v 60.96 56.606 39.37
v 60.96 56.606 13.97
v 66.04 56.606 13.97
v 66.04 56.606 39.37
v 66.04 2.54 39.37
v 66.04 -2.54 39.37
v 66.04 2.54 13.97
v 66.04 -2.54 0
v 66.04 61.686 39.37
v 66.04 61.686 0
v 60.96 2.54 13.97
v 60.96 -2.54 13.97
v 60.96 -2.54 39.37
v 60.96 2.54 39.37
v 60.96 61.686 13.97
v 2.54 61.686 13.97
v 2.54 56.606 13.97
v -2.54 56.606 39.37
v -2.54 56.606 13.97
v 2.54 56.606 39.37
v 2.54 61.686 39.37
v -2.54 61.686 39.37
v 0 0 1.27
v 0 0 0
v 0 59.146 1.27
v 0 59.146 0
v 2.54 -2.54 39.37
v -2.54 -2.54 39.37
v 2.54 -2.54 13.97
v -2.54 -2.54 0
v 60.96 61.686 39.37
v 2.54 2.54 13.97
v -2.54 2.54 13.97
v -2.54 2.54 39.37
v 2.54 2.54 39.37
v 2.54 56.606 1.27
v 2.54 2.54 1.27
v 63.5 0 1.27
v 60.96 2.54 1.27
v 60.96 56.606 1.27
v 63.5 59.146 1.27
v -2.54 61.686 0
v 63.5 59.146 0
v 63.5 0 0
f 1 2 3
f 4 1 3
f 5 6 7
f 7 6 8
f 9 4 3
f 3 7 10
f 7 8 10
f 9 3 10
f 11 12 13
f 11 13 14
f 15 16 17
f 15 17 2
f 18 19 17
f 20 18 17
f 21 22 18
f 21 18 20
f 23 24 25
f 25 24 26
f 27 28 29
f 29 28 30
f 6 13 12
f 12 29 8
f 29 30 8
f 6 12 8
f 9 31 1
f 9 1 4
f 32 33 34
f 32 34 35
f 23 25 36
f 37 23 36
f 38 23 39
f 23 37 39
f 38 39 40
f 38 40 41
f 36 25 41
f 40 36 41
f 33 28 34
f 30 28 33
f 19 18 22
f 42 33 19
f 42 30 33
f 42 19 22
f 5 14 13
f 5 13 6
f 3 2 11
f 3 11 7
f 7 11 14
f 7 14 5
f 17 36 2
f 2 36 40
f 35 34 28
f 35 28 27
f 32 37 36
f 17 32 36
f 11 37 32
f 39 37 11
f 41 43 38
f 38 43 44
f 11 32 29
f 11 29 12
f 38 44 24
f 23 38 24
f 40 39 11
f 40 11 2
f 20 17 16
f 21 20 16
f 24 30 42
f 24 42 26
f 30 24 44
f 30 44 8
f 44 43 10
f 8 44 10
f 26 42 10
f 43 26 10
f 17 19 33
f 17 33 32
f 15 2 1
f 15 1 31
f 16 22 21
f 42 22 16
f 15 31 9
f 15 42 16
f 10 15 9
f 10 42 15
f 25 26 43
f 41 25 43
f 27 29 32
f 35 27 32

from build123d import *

# Parameters (mm, degrees)
F1_DEPTH = 1.27
F2_W     = 68.58
F2_H     = 64.22644
F2_W_2   = 63.5
F2_H_2   = 59.14644
F2_W_3   = 58.42
F2_H_3   = 54.06644
F3_DEPTH = 12.7
F4_W     = 5.08
F4_H     = 5.08
F5_DEPTH = 25.4


with BuildPart() as f1:
    # F0 (on Top) → F1 (new body)
    with BuildSketch(Plane.XY):
        Polygon((0, -2.54), (0, 0), (0, 59.14644), (63.5, 59.14644), (63.5, 61.68644), (-2.54, 61.68644), (-2.54, 0), (-2.54, -2.54), align=None)
        Polygon((63.5, 0), (0, 0), (0, -2.54), (66.04, -2.54), (66.04, 59.14644), (66.04, 61.68644), (63.5, 61.68644), (63.5, 59.14644), align=None)
    extrude(amount=F1_DEPTH)

    # F2 (on face) → F3 (join)
    with BuildSketch(Plane.XY.offset(1.27)):
        with Locations((31.75, 29.57322)):
            Rectangle(F2_W, F2_H)
        with Locations((31.75, 29.57322)):
            Rectangle(F2_W_2, F2_H_2, mode=Mode.SUBTRACT)
        with Locations((31.75, 29.57322)):
            Rectangle(F2_W_2, F2_H_2)
        with Locations((31.75, 29.57322)):
            Rectangle(F2_W_3, F2_H_3, mode=Mode.SUBTRACT)
    extrude(amount=F3_DEPTH)

    # F4 (on face) → F5 (join)
    with BuildSketch(Plane.XY.offset(13.97)):
        with Locations((0, 59.14644)):
            Rectangle(F4_W, F4_H)
        Rectangle(F4_W, F4_H)
        with Locations((63.5, 0)):
            Rectangle(F4_W, F4_H)
        with Locations((63.5, 59.14644)):
            Rectangle(F4_W, F4_H)
    extrude(amount=F5_DEPTH)


solid = f1.part
